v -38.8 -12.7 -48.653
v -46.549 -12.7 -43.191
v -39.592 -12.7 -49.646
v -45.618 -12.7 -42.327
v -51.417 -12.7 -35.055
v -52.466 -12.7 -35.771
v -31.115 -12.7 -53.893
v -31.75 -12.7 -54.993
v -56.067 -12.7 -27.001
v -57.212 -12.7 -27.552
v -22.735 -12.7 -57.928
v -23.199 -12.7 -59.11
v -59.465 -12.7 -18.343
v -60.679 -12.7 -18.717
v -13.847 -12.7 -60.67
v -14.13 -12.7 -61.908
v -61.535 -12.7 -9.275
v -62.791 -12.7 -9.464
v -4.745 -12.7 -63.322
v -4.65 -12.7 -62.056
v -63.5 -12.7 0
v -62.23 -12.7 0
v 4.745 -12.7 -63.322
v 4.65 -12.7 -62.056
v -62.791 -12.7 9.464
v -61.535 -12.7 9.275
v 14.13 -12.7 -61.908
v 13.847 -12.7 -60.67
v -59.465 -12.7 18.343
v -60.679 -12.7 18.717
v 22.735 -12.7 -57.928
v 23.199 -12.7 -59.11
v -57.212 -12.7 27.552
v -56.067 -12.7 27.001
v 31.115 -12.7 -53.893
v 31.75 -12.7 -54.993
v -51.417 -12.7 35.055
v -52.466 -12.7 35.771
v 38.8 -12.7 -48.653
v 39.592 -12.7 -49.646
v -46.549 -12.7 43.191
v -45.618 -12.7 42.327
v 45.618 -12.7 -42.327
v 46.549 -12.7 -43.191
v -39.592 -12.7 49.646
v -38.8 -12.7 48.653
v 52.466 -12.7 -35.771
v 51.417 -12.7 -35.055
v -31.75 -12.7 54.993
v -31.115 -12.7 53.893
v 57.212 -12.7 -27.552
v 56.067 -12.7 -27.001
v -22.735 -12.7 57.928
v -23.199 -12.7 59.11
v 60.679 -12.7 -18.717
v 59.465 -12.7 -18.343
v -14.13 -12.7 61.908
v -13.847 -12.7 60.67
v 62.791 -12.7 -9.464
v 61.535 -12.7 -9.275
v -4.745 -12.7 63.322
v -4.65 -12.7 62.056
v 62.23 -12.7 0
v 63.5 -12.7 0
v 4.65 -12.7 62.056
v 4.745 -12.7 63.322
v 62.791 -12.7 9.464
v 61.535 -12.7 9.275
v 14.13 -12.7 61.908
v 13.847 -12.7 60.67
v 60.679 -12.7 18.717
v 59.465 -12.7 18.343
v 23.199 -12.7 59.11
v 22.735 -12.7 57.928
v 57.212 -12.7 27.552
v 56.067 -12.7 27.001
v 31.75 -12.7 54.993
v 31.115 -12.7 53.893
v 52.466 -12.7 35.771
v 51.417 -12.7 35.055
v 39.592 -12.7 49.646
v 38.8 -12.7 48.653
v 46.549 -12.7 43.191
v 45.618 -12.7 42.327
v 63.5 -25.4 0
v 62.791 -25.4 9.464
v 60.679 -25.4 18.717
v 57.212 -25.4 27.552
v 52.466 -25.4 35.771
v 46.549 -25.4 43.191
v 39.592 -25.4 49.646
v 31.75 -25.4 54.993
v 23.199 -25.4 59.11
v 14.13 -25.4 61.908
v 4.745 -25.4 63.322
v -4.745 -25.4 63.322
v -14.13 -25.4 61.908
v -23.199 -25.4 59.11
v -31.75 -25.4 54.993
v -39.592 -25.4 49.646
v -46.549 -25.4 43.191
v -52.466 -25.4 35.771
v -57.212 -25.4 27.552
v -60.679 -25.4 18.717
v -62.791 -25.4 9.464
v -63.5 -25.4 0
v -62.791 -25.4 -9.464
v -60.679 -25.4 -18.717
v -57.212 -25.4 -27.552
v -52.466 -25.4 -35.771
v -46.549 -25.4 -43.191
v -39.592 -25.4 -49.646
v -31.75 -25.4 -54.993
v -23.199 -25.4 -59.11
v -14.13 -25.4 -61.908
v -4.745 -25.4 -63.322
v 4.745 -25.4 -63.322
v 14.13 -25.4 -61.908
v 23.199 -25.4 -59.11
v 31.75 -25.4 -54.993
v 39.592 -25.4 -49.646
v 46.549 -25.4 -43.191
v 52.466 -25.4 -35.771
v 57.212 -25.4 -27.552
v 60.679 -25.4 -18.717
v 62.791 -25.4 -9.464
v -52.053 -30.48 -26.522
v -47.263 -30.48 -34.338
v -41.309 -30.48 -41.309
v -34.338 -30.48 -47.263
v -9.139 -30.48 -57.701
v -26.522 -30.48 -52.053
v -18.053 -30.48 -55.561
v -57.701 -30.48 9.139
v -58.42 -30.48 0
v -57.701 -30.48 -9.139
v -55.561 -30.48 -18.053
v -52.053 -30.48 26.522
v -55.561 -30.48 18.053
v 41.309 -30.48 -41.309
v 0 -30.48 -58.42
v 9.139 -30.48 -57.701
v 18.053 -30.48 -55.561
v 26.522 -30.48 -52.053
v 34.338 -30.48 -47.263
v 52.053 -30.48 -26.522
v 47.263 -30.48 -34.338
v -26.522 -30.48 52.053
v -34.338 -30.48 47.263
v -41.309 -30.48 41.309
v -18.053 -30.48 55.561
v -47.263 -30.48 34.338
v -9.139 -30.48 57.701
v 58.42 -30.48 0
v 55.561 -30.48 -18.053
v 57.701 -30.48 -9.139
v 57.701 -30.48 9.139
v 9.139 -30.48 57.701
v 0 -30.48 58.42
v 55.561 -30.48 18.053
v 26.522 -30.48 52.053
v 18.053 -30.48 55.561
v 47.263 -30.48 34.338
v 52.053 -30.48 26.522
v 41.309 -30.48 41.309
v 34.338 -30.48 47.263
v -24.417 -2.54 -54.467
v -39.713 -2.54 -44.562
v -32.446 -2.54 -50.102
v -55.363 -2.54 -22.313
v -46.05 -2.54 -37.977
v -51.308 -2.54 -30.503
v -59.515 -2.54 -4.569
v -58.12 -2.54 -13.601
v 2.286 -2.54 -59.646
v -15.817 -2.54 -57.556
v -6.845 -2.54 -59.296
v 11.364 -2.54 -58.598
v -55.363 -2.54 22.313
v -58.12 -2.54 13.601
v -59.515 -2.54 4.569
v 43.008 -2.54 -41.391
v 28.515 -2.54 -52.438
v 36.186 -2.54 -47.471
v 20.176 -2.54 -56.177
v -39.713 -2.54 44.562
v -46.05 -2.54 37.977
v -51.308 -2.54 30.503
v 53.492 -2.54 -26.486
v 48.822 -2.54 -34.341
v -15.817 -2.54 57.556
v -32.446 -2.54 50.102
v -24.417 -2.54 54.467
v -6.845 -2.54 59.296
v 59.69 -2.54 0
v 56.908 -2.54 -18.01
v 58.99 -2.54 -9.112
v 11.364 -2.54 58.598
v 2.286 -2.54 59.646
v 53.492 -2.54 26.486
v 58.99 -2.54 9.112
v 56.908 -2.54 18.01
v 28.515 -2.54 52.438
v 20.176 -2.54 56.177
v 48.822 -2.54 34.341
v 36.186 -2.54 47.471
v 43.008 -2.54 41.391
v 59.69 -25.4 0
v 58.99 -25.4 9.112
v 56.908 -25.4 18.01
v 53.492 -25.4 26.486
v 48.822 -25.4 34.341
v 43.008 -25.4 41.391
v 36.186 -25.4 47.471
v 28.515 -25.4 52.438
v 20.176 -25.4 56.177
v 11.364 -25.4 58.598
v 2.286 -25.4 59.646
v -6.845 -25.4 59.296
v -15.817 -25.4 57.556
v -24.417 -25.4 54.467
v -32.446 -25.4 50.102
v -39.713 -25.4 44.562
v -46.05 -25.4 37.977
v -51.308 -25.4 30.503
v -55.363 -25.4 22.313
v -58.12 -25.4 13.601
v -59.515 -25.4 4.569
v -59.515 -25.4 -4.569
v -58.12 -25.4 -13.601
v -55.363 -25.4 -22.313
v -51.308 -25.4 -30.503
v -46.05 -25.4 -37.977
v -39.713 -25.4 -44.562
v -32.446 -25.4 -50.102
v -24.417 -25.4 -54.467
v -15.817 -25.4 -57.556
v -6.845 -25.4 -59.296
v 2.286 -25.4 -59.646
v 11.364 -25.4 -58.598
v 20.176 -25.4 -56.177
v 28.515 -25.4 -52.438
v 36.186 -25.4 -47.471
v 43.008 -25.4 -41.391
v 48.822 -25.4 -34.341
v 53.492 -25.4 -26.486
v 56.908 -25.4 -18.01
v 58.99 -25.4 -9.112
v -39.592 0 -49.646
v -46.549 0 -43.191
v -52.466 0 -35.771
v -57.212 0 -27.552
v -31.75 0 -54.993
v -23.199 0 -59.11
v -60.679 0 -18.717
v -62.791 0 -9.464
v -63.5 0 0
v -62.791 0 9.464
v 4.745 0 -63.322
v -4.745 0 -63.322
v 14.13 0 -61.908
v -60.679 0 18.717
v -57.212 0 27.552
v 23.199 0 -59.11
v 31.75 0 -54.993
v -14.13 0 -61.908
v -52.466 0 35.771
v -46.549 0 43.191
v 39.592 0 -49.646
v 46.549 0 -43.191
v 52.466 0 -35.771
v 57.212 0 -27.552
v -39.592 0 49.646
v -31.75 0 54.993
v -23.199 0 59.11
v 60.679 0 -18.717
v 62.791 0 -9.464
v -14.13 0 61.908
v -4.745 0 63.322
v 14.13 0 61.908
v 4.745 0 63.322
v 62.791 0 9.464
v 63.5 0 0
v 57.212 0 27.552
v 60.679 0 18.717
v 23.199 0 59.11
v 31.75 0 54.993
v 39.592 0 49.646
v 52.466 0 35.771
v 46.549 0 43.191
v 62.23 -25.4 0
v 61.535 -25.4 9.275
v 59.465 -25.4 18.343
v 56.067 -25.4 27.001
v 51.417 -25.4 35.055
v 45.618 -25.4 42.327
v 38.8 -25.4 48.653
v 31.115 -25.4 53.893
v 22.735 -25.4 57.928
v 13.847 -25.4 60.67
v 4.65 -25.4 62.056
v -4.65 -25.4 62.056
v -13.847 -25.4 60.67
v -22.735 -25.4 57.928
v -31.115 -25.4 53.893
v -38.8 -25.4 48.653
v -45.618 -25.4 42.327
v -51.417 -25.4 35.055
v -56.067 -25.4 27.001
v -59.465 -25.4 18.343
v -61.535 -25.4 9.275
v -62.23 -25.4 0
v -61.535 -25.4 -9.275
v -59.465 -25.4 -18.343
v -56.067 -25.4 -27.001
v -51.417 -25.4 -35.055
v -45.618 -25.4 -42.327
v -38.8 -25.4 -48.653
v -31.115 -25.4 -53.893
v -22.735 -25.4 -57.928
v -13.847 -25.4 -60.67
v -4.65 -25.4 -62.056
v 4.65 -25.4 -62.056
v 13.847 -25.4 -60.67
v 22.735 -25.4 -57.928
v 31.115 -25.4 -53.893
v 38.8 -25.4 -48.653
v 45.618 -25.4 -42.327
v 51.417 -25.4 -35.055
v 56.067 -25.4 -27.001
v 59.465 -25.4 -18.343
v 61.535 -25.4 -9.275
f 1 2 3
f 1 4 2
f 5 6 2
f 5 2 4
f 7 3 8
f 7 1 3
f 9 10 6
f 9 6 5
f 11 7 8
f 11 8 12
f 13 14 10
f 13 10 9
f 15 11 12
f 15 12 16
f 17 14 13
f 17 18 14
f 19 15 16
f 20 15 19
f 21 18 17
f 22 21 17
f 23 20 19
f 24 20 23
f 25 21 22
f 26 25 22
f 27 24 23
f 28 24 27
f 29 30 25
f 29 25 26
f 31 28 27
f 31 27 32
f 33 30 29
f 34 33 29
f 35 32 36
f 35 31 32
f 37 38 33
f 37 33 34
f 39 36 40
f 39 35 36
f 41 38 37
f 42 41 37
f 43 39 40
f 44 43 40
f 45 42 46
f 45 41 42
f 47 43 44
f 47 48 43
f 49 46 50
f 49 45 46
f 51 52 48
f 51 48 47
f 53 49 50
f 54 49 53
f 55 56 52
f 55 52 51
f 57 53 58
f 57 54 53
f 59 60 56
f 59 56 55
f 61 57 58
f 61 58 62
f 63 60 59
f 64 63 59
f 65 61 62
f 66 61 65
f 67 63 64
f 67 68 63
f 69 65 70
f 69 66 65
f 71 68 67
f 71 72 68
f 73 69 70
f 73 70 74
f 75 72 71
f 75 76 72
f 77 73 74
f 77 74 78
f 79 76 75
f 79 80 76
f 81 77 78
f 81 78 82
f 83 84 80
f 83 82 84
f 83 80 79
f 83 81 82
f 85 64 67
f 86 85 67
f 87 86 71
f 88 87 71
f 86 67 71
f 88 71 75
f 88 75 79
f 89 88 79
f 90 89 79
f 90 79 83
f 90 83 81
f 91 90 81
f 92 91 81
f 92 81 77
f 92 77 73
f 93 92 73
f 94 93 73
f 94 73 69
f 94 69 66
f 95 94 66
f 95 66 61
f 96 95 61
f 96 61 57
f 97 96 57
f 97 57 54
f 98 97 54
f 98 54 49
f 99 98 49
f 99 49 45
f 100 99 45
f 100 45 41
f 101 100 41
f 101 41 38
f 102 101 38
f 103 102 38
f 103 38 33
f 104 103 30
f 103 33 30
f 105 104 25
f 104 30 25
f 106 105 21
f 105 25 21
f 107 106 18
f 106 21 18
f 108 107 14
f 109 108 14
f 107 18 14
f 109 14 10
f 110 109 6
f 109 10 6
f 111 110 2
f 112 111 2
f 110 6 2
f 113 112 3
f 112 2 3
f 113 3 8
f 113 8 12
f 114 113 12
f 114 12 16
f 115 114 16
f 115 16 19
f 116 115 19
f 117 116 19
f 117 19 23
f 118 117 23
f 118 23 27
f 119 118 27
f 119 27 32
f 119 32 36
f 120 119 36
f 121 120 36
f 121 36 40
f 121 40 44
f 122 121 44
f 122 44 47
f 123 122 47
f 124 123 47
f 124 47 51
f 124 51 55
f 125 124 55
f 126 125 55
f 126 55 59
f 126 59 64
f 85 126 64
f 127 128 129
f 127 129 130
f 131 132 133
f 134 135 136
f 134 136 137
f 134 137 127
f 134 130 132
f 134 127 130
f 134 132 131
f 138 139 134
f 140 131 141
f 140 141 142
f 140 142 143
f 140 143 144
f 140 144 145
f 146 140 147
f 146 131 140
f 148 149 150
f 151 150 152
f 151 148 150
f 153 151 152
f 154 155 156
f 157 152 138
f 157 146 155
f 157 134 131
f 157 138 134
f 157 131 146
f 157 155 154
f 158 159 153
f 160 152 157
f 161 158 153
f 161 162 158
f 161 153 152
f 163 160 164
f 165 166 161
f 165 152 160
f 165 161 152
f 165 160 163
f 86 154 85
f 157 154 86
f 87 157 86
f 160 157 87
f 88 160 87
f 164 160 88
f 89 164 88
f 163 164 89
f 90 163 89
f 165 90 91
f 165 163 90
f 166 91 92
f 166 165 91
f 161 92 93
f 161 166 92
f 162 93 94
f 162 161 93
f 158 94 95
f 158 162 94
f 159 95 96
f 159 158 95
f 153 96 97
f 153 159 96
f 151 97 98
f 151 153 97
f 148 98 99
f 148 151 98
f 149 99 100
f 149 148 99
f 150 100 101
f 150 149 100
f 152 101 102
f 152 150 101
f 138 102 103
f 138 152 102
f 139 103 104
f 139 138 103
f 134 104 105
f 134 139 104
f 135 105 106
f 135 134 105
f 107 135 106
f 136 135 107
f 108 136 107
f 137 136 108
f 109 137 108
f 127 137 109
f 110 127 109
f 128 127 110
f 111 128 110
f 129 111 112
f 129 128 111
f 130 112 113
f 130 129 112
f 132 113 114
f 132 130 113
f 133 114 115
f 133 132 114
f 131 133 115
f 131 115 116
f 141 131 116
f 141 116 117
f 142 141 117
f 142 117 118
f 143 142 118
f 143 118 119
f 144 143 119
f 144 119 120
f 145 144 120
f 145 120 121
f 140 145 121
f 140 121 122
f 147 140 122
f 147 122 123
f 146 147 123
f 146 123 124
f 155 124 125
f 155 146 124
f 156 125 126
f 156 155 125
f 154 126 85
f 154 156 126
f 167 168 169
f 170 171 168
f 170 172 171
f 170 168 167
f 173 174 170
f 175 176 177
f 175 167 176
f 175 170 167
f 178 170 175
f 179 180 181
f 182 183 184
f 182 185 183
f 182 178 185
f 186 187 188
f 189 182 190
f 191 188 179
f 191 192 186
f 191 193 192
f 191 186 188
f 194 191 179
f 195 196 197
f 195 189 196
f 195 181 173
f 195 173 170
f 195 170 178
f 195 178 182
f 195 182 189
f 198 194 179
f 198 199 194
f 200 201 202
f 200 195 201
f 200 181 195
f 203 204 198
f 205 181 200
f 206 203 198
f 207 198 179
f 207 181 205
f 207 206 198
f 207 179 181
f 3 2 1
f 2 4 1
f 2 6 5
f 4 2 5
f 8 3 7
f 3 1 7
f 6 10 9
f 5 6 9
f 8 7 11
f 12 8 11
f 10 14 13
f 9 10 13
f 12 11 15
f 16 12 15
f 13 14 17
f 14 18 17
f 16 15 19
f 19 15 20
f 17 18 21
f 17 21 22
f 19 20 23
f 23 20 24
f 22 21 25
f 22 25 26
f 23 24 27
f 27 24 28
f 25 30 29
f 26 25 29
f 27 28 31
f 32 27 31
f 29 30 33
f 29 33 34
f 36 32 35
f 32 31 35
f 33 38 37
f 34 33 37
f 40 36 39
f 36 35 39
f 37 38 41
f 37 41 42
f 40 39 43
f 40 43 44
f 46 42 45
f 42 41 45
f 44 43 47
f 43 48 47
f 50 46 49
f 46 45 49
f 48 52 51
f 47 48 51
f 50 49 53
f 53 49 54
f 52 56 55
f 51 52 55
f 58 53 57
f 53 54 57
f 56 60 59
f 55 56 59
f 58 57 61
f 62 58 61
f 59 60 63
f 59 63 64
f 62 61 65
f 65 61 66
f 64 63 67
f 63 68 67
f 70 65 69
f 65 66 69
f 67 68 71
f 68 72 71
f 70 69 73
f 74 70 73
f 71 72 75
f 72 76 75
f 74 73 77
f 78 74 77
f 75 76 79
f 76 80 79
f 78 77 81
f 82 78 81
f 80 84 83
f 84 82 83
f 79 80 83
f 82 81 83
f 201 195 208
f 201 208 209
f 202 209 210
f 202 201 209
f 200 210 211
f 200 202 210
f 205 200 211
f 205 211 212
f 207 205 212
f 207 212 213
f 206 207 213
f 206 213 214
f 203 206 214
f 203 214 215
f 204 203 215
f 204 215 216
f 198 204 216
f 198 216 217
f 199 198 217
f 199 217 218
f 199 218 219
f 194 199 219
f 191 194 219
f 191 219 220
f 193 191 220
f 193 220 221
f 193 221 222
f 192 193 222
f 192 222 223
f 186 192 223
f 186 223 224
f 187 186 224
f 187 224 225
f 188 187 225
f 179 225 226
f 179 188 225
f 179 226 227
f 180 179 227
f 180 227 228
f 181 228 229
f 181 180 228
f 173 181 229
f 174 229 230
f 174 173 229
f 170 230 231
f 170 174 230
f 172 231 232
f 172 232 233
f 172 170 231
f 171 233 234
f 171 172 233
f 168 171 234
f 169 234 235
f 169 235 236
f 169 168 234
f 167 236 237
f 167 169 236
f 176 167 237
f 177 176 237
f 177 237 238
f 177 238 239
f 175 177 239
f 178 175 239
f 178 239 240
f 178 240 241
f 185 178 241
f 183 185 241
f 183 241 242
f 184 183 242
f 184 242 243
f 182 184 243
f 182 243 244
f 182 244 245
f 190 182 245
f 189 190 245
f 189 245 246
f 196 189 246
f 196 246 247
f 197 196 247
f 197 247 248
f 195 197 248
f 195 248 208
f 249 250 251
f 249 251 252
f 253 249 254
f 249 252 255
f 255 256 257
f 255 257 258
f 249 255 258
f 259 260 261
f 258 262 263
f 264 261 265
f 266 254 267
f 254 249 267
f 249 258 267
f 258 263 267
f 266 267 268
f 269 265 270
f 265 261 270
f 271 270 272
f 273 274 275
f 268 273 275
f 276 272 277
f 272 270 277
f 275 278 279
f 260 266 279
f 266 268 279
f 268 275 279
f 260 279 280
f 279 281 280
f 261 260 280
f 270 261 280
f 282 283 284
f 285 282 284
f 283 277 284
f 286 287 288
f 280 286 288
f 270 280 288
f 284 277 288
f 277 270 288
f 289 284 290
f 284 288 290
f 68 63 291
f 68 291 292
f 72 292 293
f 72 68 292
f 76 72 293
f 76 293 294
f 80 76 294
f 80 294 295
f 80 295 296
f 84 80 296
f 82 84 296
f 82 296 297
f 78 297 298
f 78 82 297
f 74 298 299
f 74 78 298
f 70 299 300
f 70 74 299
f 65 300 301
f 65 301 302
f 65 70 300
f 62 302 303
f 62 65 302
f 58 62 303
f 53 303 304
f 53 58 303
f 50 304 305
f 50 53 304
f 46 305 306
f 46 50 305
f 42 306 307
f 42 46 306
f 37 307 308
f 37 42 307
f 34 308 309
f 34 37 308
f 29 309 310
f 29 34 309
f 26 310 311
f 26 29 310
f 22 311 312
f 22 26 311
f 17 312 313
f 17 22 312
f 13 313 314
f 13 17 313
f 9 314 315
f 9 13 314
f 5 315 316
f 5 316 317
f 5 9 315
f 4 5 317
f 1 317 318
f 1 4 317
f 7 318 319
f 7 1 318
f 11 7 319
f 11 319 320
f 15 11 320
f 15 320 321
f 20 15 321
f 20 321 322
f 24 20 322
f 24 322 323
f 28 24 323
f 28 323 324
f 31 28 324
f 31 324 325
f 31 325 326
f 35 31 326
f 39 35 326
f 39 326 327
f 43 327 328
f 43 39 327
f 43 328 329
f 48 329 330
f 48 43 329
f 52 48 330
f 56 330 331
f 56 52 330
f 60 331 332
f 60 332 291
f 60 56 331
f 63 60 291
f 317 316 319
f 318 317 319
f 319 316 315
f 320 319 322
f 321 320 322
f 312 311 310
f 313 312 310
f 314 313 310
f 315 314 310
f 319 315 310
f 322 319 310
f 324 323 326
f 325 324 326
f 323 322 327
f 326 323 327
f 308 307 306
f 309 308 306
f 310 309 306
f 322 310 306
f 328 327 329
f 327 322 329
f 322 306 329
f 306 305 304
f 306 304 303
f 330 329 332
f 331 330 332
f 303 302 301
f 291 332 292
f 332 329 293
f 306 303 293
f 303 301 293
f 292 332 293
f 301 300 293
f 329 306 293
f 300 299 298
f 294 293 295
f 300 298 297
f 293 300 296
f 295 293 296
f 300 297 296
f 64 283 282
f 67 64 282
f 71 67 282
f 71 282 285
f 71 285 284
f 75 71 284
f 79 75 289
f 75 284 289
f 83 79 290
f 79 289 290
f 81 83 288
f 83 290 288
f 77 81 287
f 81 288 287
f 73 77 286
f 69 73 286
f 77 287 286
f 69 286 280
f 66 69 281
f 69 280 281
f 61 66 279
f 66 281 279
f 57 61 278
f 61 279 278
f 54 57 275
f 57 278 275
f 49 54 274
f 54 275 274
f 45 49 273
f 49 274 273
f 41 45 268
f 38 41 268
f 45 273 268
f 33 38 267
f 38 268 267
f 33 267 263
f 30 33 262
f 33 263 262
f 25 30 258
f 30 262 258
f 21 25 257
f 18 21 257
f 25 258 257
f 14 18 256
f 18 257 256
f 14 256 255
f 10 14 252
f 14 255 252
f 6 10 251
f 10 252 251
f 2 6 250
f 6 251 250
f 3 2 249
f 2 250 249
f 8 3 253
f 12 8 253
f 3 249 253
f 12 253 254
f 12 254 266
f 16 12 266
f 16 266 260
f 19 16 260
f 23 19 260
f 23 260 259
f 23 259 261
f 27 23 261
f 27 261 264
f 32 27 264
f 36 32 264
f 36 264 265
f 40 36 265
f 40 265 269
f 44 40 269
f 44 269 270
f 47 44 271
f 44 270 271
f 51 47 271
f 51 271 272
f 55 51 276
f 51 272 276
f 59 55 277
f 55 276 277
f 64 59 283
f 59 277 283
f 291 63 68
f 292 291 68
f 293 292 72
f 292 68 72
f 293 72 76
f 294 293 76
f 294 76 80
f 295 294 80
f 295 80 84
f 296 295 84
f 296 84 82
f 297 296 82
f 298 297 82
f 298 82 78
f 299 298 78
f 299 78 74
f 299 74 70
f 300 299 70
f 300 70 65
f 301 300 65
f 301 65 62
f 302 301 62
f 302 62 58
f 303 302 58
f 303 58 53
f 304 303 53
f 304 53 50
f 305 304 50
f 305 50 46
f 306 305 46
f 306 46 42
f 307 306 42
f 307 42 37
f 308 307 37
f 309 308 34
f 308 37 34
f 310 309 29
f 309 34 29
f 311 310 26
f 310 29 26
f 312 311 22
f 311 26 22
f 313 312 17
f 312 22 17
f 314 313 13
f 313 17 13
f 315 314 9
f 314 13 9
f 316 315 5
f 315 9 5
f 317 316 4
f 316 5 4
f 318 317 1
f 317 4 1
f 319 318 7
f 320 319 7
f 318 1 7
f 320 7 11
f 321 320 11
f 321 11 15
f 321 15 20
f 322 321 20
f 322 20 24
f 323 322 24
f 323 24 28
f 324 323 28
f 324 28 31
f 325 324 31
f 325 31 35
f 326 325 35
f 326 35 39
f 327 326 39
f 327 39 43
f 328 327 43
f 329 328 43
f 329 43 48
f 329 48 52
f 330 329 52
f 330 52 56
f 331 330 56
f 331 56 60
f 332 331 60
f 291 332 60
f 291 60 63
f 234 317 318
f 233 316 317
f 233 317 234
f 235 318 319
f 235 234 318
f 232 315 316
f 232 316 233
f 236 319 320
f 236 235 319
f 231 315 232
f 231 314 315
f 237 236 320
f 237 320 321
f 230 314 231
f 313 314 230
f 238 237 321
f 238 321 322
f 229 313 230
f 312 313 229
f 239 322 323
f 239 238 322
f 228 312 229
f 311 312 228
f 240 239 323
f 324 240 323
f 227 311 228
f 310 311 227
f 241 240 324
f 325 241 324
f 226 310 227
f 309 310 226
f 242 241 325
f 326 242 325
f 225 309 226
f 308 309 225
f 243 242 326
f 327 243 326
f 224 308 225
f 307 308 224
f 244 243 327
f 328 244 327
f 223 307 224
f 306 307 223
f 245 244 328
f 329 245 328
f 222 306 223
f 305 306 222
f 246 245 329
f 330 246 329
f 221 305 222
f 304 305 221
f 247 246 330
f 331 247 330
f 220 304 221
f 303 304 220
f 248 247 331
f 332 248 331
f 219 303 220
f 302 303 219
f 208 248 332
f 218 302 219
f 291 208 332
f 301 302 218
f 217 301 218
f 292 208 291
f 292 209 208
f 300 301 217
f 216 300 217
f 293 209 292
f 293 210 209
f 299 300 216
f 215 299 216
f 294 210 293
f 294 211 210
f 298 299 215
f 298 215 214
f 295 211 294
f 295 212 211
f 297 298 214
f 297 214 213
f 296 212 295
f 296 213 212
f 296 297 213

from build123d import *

# Parameters (mm, degrees)
F0_R     = 62.23
F5_DEPTH = 25.4
F1_T     = -2.54
F0_R_2   = 63.5
F6_DEPTH = 12.7
F2_DEPTH = 12.7
F7_R     = 63.5
F3_DEPTH = 5.08
F4_SIZE  = 5.08


with BuildPart() as f5:
    # F0 (on Front) → F5 (new body)
    with BuildSketch(Plane.XZ):
        Circle(F0_R)
    extrude(amount=F5_DEPTH)

    # F1
    f1_openings = [f5.faces().sort_by_distance(p)[0] for p in [
        (0, -25.4, 0),
    ]]
    offset(amount=F1_T, openings=f1_openings)

    # F0 (on Front) → F6 (join)
    with BuildSketch(Plane.XZ):
        Circle(F0_R_2)
        Circle(F0_R, mode=Mode.SUBTRACT)
    extrude(amount=F6_DEPTH)


with BuildPart() as f2:
    # F2 (new): a face of the model
    f2_faces = [f5.part.faces().sort_by_distance(p)[0] for p in [
        (-63.3203948776, -12.7, 0),
    ]]
    extrude(f2_faces, amount=F2_DEPTH)

    # F7 (on face) → F3 (join)
    with BuildSketch(Plane.XZ.offset(25.4)):
        Circle(F7_R)
    extrude(amount=F3_DEPTH)

    # F4
    f4_edges = [f2.edges().sort_by_distance(p)[0] for p in [
        (-63.5, -30.48, 0),
    ]]
    chamfer(f4_edges, length=F4_SIZE)


solid = Compound([f5.part, f2.part])
